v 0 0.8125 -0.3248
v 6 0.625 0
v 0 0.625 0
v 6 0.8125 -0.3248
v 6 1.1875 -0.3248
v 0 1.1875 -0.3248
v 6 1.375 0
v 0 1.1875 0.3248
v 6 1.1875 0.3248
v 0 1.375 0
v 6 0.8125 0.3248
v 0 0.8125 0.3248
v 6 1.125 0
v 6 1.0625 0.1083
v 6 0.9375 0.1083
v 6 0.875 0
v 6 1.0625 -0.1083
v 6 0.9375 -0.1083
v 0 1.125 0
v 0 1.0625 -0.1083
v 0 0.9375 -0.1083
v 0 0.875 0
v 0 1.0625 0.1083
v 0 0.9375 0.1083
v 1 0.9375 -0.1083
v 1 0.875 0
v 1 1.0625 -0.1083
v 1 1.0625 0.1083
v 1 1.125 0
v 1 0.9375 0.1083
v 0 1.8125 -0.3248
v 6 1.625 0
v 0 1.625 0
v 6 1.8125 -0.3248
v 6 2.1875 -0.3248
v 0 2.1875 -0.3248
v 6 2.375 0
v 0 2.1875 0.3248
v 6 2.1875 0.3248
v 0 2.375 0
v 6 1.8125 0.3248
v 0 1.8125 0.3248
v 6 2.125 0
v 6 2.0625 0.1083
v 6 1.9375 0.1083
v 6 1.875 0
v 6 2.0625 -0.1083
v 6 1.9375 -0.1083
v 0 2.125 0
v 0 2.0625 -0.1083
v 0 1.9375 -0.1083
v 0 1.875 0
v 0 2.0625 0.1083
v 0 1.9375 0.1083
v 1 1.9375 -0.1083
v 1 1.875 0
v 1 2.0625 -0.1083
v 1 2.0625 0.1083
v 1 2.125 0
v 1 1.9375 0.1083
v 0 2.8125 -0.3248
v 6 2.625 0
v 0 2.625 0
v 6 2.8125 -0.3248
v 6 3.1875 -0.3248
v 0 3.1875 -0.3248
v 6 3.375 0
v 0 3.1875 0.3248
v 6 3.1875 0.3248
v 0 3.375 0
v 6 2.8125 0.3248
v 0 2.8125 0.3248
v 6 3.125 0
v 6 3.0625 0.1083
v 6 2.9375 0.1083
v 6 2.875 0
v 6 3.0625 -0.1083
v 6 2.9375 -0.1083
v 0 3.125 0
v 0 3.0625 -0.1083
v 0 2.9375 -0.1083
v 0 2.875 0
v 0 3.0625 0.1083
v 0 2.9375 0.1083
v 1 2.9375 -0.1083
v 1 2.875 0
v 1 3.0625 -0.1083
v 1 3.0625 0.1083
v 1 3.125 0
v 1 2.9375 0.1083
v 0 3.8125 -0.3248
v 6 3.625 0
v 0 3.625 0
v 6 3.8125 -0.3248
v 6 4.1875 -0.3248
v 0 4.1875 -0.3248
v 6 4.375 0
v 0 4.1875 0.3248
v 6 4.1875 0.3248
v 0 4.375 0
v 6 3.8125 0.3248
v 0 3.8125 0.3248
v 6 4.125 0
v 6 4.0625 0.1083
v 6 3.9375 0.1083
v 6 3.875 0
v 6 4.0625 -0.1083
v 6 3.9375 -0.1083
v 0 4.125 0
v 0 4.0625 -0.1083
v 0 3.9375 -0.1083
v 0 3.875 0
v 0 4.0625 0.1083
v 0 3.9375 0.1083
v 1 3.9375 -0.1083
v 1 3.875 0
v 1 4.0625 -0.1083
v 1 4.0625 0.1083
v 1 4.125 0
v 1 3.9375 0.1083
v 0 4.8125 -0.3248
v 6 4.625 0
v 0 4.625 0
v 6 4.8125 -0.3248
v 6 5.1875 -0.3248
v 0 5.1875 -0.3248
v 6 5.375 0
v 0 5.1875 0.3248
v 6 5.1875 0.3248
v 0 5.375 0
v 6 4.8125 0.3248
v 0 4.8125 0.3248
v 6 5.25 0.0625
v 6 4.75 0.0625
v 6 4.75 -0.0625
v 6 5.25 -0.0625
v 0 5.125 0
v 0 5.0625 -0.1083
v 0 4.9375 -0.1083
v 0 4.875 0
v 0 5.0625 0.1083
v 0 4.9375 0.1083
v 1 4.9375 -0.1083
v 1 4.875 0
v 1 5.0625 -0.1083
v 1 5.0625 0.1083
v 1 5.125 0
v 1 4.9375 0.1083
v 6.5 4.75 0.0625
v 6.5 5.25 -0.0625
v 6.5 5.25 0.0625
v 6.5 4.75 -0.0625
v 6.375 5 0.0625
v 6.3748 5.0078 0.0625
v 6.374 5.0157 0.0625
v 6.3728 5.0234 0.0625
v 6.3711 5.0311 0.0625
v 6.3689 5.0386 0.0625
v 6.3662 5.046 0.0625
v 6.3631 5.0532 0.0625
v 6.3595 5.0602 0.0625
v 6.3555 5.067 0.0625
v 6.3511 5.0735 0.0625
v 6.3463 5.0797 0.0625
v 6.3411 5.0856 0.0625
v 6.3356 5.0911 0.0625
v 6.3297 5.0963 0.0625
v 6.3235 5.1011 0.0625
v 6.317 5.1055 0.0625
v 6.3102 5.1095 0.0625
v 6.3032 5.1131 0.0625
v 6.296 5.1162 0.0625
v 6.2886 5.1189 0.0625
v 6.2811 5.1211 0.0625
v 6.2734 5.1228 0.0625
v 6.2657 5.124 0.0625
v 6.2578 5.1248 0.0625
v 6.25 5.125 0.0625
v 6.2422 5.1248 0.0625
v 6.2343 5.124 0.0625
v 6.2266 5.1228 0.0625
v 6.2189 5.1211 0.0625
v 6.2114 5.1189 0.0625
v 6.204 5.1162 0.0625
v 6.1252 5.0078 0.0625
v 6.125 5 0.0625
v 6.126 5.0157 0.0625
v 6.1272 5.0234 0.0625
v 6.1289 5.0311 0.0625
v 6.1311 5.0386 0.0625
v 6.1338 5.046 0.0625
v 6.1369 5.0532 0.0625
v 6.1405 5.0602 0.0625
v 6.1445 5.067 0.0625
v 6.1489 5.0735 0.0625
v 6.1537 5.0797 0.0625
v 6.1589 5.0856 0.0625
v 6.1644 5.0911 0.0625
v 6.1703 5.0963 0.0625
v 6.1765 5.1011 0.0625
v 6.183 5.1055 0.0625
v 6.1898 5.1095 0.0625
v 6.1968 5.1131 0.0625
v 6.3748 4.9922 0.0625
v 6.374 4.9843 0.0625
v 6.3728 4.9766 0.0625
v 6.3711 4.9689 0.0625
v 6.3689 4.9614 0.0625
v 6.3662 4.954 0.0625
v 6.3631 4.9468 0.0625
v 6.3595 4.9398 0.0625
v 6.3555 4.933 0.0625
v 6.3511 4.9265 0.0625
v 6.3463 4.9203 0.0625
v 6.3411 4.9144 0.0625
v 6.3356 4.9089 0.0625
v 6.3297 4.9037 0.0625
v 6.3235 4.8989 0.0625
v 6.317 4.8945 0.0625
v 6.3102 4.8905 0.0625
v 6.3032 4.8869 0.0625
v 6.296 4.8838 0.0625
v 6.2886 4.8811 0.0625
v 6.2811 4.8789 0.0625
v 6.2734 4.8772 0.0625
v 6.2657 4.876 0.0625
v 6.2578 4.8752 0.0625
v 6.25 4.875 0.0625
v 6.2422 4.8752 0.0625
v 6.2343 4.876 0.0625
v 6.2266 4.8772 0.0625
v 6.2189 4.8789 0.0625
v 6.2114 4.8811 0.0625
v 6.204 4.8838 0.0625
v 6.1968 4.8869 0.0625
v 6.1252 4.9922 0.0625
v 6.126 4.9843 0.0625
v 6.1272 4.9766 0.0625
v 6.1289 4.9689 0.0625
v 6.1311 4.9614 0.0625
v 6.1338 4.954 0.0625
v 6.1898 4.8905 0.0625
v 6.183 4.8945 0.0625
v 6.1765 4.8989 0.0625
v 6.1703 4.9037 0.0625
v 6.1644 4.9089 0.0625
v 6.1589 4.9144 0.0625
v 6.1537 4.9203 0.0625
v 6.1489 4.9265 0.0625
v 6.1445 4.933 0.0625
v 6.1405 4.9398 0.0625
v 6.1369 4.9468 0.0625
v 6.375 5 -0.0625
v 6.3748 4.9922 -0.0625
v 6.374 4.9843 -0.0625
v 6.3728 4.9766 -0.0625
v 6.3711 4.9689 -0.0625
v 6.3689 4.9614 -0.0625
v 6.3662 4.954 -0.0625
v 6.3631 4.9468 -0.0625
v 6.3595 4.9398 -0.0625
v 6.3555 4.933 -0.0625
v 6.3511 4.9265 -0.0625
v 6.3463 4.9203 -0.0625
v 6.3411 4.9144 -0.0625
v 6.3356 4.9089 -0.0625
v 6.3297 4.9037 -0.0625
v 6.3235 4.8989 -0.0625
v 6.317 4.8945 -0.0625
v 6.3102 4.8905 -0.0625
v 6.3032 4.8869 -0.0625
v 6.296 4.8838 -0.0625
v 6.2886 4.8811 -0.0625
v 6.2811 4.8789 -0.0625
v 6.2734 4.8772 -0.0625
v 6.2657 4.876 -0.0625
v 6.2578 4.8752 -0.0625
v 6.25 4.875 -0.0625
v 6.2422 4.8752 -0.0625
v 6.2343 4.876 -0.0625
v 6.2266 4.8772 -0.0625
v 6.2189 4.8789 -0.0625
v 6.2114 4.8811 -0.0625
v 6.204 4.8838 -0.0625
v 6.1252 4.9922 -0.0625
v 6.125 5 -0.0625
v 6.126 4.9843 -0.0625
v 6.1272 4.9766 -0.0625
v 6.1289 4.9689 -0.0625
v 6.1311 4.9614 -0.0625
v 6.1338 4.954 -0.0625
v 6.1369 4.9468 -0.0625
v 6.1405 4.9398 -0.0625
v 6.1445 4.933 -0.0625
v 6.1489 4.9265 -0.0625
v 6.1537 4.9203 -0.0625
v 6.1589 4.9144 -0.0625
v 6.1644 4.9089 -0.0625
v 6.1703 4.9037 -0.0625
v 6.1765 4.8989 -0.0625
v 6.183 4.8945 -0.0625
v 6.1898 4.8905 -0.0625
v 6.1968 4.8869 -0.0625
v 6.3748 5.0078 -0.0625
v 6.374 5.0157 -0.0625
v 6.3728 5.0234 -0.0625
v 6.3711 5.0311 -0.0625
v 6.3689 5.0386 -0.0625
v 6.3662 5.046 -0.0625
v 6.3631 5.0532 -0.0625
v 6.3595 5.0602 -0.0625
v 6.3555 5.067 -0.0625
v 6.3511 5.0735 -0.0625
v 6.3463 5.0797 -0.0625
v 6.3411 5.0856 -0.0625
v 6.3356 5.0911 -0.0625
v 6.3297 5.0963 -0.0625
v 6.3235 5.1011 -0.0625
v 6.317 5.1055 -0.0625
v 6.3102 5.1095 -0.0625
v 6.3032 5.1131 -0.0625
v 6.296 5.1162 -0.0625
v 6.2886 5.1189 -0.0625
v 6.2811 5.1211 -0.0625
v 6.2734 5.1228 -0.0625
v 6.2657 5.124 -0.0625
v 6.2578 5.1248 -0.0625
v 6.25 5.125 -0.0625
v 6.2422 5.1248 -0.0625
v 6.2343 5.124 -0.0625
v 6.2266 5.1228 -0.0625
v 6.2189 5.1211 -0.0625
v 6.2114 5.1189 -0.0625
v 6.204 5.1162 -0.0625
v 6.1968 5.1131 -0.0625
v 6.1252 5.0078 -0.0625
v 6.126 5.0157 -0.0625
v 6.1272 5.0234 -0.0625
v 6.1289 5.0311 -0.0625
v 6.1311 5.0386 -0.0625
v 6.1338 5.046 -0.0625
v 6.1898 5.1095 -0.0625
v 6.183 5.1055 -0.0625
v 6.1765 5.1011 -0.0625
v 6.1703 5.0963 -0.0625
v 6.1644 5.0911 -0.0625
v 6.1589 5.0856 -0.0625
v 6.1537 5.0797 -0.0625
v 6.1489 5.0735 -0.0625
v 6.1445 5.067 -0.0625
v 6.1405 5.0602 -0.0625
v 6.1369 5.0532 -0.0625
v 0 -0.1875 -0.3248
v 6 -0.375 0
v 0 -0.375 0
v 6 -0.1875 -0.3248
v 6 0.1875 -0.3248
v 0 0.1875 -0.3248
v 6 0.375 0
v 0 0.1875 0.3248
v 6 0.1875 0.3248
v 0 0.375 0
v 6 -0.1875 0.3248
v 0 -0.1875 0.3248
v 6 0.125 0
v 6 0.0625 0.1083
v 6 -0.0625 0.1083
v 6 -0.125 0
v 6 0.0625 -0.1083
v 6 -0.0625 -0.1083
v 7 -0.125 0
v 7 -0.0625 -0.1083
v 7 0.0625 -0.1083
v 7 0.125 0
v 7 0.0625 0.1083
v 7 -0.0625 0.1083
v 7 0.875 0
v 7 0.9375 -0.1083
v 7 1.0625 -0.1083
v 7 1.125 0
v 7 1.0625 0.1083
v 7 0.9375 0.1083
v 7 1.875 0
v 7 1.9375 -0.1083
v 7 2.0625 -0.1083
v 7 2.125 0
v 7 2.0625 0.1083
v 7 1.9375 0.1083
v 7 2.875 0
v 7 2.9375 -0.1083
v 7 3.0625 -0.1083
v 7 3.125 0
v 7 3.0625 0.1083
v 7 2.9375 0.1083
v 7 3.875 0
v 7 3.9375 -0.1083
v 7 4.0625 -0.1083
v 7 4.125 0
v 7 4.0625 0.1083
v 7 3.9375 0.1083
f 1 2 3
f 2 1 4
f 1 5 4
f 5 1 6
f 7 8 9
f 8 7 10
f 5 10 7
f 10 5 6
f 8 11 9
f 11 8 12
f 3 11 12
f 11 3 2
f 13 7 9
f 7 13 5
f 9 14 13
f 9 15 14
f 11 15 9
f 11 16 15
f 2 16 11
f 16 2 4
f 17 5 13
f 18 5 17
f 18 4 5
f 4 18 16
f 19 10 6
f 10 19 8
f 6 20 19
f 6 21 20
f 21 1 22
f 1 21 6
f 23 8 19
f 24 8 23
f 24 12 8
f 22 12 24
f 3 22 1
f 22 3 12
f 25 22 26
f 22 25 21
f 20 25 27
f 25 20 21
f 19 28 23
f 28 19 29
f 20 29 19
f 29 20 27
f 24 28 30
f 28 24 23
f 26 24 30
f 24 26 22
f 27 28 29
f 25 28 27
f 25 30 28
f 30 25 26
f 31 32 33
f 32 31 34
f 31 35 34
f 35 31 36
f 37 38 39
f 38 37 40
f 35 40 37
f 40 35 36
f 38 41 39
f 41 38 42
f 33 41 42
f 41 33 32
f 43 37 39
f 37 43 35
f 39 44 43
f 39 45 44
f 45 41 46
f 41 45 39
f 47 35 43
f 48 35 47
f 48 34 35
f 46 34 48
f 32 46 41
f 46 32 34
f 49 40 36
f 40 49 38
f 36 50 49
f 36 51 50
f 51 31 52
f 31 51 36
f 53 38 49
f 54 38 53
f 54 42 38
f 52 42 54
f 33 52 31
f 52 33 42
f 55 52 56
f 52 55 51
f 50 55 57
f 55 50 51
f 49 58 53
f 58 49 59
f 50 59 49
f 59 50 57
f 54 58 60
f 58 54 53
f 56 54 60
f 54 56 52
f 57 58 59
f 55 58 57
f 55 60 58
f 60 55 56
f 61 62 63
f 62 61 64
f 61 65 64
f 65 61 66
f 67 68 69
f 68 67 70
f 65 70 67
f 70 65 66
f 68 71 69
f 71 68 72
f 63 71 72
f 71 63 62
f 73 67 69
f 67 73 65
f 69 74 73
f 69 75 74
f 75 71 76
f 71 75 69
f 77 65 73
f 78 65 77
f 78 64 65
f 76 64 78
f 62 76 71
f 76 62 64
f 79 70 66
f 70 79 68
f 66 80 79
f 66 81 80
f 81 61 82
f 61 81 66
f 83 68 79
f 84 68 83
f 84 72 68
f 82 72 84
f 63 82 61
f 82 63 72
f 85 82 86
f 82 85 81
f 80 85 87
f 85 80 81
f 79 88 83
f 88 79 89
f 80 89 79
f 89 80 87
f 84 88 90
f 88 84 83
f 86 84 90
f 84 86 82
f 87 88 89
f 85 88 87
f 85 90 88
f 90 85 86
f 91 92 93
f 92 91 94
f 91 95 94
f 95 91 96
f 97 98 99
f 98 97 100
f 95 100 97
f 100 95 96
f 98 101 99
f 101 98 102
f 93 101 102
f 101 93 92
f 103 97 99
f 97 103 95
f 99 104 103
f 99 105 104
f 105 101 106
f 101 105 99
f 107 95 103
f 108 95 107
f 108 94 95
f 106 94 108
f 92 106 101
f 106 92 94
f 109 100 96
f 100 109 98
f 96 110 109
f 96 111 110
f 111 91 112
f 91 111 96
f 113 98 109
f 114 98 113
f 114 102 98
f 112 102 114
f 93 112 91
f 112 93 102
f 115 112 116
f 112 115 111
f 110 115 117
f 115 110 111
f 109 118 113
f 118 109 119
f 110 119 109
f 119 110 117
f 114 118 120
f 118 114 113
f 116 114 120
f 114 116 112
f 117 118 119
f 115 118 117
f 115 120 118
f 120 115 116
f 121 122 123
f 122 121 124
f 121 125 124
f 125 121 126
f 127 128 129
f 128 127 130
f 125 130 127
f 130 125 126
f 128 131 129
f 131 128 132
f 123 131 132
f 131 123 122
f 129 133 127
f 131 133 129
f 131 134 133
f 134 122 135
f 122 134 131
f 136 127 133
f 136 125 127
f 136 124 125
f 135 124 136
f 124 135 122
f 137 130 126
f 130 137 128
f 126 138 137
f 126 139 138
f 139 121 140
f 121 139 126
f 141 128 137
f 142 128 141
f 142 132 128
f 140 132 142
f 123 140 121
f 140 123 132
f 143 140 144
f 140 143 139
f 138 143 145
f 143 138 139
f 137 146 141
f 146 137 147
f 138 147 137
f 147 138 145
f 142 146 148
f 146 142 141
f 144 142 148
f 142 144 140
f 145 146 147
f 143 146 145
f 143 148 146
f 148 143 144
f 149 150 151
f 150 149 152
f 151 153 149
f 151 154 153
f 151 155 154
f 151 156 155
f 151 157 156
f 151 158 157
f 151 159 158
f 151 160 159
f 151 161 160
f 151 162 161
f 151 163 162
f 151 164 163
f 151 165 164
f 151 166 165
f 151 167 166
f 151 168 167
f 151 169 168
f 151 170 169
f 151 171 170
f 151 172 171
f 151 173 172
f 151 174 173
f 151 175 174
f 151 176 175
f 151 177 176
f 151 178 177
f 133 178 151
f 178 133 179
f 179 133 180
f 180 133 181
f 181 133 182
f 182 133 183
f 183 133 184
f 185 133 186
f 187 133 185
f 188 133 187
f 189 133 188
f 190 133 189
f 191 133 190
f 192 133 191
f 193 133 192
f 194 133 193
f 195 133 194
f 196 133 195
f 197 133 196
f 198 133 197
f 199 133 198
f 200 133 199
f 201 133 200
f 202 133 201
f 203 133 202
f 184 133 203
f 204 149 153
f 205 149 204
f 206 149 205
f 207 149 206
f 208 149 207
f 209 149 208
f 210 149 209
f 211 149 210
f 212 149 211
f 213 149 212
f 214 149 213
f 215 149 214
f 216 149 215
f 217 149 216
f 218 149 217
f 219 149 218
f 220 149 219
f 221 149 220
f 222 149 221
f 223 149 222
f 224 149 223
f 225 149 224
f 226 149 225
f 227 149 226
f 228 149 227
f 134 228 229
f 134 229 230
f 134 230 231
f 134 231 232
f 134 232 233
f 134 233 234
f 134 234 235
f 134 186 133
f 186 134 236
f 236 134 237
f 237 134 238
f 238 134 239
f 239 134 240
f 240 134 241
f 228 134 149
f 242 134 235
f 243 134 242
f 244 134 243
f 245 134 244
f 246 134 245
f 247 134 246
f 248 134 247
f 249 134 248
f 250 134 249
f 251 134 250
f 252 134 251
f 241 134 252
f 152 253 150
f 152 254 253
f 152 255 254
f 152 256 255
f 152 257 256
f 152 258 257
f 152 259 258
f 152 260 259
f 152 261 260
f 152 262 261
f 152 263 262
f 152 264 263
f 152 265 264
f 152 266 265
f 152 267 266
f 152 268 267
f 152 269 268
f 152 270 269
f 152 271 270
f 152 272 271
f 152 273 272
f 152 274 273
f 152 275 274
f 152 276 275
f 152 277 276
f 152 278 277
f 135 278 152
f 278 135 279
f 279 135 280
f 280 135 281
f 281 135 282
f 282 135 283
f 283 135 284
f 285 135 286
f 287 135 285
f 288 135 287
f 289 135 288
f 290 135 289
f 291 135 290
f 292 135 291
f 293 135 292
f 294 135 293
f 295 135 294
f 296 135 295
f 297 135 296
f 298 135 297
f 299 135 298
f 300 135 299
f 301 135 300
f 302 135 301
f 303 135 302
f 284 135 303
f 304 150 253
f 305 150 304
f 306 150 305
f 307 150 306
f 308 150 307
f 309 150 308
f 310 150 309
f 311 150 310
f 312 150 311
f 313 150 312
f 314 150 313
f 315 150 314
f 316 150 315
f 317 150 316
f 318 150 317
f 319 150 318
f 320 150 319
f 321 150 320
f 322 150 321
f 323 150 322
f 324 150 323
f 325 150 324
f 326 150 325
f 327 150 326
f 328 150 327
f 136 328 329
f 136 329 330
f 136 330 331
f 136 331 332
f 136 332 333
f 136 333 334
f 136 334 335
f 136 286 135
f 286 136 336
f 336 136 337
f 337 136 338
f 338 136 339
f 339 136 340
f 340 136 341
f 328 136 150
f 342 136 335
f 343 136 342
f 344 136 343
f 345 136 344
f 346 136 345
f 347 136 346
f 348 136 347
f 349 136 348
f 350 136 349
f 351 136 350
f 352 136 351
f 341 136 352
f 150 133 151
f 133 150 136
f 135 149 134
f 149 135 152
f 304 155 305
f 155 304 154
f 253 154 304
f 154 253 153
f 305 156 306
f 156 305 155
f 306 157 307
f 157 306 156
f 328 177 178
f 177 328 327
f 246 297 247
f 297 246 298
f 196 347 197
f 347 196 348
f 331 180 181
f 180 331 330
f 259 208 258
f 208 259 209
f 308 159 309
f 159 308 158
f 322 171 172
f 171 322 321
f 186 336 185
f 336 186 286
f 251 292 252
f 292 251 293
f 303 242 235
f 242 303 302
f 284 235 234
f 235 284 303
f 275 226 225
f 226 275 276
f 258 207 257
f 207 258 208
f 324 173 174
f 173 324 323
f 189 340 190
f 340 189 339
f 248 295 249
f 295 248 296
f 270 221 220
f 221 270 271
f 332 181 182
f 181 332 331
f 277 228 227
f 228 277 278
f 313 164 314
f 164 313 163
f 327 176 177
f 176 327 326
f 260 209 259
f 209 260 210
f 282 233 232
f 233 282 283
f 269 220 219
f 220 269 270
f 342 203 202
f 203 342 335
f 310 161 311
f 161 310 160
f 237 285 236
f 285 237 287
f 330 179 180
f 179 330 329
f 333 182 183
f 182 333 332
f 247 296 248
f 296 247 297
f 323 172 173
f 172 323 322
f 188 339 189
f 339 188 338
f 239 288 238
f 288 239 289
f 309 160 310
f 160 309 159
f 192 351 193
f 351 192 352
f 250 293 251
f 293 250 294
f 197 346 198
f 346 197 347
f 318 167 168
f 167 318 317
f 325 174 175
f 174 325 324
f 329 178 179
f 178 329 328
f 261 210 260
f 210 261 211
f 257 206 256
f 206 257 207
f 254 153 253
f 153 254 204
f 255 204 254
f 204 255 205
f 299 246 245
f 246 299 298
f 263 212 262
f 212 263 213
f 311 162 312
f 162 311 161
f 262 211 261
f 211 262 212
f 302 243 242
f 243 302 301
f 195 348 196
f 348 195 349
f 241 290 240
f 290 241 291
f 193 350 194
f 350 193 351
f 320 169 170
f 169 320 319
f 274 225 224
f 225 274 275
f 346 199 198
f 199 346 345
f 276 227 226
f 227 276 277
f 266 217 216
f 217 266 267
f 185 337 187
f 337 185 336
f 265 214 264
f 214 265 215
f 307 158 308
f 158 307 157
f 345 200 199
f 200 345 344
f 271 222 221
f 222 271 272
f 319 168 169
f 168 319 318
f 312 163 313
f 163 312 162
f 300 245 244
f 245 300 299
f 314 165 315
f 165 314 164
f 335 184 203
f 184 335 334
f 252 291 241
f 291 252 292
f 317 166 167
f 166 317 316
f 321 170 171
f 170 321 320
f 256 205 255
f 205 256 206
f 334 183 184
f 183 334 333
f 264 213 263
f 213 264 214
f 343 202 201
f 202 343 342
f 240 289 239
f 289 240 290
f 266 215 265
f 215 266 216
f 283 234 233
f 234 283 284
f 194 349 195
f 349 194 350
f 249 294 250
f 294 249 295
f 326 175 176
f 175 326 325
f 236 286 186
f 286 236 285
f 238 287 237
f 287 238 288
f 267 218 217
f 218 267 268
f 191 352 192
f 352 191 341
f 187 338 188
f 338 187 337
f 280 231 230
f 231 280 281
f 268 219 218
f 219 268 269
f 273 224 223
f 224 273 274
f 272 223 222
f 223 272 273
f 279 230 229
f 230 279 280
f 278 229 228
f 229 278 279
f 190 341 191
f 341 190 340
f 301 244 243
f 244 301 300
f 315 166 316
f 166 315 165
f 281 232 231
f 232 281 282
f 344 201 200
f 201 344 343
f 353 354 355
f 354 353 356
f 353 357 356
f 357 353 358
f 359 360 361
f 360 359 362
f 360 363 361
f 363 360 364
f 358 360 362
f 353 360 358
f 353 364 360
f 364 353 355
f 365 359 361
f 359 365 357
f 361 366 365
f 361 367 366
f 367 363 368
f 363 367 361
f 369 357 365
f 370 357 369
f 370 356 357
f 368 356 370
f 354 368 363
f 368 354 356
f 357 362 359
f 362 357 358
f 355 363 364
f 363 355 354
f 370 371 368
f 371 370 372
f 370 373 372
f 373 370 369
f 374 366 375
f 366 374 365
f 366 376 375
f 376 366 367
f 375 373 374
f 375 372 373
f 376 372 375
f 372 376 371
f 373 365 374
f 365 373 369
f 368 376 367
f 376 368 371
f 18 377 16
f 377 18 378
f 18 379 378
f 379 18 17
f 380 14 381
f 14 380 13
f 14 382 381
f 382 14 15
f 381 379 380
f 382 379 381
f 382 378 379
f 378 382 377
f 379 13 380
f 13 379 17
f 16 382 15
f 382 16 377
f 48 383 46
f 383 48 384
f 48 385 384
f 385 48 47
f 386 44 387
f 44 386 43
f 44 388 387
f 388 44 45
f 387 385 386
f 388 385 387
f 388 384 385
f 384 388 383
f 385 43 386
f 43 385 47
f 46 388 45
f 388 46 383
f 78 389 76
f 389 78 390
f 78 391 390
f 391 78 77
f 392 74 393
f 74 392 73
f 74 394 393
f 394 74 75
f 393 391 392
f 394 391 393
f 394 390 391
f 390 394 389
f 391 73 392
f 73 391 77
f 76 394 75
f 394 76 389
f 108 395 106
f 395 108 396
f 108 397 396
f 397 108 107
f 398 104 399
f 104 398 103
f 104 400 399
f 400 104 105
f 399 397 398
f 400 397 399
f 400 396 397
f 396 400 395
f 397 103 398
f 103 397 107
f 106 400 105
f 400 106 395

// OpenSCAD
/*
 * @author Robotia
 * @brief Standard blinds wand in sections. Print & glue together. Use a paper clip to attach it if needed.
 */

for (i = [0:6:35]) {
    translate([0,i/6,0])
    rotate([0,90,0]) {
        rotate(30) {
            difference() {
                cylinder(r=3/8,h=6, $fn=6);
                
                if (i != 0)
                cylinder(r=1/8,h=1,$fn=6);
                
            }

        }
    }
    if (i != 30) {
        translate([6,i/6,0])
        rotate([0,90,0])
        rotate(30)
        cylinder(r=1/8,h=1,$fn=6);
    } else {
        translate([6,i/6,0])
        difference() {
            cube([1, 1/2, 1/8], center=true);
            translate([1/4,0,-1/4])
            cylinder(r=1/8, h=1/2, $fn=100);
        }
        
    }
}
